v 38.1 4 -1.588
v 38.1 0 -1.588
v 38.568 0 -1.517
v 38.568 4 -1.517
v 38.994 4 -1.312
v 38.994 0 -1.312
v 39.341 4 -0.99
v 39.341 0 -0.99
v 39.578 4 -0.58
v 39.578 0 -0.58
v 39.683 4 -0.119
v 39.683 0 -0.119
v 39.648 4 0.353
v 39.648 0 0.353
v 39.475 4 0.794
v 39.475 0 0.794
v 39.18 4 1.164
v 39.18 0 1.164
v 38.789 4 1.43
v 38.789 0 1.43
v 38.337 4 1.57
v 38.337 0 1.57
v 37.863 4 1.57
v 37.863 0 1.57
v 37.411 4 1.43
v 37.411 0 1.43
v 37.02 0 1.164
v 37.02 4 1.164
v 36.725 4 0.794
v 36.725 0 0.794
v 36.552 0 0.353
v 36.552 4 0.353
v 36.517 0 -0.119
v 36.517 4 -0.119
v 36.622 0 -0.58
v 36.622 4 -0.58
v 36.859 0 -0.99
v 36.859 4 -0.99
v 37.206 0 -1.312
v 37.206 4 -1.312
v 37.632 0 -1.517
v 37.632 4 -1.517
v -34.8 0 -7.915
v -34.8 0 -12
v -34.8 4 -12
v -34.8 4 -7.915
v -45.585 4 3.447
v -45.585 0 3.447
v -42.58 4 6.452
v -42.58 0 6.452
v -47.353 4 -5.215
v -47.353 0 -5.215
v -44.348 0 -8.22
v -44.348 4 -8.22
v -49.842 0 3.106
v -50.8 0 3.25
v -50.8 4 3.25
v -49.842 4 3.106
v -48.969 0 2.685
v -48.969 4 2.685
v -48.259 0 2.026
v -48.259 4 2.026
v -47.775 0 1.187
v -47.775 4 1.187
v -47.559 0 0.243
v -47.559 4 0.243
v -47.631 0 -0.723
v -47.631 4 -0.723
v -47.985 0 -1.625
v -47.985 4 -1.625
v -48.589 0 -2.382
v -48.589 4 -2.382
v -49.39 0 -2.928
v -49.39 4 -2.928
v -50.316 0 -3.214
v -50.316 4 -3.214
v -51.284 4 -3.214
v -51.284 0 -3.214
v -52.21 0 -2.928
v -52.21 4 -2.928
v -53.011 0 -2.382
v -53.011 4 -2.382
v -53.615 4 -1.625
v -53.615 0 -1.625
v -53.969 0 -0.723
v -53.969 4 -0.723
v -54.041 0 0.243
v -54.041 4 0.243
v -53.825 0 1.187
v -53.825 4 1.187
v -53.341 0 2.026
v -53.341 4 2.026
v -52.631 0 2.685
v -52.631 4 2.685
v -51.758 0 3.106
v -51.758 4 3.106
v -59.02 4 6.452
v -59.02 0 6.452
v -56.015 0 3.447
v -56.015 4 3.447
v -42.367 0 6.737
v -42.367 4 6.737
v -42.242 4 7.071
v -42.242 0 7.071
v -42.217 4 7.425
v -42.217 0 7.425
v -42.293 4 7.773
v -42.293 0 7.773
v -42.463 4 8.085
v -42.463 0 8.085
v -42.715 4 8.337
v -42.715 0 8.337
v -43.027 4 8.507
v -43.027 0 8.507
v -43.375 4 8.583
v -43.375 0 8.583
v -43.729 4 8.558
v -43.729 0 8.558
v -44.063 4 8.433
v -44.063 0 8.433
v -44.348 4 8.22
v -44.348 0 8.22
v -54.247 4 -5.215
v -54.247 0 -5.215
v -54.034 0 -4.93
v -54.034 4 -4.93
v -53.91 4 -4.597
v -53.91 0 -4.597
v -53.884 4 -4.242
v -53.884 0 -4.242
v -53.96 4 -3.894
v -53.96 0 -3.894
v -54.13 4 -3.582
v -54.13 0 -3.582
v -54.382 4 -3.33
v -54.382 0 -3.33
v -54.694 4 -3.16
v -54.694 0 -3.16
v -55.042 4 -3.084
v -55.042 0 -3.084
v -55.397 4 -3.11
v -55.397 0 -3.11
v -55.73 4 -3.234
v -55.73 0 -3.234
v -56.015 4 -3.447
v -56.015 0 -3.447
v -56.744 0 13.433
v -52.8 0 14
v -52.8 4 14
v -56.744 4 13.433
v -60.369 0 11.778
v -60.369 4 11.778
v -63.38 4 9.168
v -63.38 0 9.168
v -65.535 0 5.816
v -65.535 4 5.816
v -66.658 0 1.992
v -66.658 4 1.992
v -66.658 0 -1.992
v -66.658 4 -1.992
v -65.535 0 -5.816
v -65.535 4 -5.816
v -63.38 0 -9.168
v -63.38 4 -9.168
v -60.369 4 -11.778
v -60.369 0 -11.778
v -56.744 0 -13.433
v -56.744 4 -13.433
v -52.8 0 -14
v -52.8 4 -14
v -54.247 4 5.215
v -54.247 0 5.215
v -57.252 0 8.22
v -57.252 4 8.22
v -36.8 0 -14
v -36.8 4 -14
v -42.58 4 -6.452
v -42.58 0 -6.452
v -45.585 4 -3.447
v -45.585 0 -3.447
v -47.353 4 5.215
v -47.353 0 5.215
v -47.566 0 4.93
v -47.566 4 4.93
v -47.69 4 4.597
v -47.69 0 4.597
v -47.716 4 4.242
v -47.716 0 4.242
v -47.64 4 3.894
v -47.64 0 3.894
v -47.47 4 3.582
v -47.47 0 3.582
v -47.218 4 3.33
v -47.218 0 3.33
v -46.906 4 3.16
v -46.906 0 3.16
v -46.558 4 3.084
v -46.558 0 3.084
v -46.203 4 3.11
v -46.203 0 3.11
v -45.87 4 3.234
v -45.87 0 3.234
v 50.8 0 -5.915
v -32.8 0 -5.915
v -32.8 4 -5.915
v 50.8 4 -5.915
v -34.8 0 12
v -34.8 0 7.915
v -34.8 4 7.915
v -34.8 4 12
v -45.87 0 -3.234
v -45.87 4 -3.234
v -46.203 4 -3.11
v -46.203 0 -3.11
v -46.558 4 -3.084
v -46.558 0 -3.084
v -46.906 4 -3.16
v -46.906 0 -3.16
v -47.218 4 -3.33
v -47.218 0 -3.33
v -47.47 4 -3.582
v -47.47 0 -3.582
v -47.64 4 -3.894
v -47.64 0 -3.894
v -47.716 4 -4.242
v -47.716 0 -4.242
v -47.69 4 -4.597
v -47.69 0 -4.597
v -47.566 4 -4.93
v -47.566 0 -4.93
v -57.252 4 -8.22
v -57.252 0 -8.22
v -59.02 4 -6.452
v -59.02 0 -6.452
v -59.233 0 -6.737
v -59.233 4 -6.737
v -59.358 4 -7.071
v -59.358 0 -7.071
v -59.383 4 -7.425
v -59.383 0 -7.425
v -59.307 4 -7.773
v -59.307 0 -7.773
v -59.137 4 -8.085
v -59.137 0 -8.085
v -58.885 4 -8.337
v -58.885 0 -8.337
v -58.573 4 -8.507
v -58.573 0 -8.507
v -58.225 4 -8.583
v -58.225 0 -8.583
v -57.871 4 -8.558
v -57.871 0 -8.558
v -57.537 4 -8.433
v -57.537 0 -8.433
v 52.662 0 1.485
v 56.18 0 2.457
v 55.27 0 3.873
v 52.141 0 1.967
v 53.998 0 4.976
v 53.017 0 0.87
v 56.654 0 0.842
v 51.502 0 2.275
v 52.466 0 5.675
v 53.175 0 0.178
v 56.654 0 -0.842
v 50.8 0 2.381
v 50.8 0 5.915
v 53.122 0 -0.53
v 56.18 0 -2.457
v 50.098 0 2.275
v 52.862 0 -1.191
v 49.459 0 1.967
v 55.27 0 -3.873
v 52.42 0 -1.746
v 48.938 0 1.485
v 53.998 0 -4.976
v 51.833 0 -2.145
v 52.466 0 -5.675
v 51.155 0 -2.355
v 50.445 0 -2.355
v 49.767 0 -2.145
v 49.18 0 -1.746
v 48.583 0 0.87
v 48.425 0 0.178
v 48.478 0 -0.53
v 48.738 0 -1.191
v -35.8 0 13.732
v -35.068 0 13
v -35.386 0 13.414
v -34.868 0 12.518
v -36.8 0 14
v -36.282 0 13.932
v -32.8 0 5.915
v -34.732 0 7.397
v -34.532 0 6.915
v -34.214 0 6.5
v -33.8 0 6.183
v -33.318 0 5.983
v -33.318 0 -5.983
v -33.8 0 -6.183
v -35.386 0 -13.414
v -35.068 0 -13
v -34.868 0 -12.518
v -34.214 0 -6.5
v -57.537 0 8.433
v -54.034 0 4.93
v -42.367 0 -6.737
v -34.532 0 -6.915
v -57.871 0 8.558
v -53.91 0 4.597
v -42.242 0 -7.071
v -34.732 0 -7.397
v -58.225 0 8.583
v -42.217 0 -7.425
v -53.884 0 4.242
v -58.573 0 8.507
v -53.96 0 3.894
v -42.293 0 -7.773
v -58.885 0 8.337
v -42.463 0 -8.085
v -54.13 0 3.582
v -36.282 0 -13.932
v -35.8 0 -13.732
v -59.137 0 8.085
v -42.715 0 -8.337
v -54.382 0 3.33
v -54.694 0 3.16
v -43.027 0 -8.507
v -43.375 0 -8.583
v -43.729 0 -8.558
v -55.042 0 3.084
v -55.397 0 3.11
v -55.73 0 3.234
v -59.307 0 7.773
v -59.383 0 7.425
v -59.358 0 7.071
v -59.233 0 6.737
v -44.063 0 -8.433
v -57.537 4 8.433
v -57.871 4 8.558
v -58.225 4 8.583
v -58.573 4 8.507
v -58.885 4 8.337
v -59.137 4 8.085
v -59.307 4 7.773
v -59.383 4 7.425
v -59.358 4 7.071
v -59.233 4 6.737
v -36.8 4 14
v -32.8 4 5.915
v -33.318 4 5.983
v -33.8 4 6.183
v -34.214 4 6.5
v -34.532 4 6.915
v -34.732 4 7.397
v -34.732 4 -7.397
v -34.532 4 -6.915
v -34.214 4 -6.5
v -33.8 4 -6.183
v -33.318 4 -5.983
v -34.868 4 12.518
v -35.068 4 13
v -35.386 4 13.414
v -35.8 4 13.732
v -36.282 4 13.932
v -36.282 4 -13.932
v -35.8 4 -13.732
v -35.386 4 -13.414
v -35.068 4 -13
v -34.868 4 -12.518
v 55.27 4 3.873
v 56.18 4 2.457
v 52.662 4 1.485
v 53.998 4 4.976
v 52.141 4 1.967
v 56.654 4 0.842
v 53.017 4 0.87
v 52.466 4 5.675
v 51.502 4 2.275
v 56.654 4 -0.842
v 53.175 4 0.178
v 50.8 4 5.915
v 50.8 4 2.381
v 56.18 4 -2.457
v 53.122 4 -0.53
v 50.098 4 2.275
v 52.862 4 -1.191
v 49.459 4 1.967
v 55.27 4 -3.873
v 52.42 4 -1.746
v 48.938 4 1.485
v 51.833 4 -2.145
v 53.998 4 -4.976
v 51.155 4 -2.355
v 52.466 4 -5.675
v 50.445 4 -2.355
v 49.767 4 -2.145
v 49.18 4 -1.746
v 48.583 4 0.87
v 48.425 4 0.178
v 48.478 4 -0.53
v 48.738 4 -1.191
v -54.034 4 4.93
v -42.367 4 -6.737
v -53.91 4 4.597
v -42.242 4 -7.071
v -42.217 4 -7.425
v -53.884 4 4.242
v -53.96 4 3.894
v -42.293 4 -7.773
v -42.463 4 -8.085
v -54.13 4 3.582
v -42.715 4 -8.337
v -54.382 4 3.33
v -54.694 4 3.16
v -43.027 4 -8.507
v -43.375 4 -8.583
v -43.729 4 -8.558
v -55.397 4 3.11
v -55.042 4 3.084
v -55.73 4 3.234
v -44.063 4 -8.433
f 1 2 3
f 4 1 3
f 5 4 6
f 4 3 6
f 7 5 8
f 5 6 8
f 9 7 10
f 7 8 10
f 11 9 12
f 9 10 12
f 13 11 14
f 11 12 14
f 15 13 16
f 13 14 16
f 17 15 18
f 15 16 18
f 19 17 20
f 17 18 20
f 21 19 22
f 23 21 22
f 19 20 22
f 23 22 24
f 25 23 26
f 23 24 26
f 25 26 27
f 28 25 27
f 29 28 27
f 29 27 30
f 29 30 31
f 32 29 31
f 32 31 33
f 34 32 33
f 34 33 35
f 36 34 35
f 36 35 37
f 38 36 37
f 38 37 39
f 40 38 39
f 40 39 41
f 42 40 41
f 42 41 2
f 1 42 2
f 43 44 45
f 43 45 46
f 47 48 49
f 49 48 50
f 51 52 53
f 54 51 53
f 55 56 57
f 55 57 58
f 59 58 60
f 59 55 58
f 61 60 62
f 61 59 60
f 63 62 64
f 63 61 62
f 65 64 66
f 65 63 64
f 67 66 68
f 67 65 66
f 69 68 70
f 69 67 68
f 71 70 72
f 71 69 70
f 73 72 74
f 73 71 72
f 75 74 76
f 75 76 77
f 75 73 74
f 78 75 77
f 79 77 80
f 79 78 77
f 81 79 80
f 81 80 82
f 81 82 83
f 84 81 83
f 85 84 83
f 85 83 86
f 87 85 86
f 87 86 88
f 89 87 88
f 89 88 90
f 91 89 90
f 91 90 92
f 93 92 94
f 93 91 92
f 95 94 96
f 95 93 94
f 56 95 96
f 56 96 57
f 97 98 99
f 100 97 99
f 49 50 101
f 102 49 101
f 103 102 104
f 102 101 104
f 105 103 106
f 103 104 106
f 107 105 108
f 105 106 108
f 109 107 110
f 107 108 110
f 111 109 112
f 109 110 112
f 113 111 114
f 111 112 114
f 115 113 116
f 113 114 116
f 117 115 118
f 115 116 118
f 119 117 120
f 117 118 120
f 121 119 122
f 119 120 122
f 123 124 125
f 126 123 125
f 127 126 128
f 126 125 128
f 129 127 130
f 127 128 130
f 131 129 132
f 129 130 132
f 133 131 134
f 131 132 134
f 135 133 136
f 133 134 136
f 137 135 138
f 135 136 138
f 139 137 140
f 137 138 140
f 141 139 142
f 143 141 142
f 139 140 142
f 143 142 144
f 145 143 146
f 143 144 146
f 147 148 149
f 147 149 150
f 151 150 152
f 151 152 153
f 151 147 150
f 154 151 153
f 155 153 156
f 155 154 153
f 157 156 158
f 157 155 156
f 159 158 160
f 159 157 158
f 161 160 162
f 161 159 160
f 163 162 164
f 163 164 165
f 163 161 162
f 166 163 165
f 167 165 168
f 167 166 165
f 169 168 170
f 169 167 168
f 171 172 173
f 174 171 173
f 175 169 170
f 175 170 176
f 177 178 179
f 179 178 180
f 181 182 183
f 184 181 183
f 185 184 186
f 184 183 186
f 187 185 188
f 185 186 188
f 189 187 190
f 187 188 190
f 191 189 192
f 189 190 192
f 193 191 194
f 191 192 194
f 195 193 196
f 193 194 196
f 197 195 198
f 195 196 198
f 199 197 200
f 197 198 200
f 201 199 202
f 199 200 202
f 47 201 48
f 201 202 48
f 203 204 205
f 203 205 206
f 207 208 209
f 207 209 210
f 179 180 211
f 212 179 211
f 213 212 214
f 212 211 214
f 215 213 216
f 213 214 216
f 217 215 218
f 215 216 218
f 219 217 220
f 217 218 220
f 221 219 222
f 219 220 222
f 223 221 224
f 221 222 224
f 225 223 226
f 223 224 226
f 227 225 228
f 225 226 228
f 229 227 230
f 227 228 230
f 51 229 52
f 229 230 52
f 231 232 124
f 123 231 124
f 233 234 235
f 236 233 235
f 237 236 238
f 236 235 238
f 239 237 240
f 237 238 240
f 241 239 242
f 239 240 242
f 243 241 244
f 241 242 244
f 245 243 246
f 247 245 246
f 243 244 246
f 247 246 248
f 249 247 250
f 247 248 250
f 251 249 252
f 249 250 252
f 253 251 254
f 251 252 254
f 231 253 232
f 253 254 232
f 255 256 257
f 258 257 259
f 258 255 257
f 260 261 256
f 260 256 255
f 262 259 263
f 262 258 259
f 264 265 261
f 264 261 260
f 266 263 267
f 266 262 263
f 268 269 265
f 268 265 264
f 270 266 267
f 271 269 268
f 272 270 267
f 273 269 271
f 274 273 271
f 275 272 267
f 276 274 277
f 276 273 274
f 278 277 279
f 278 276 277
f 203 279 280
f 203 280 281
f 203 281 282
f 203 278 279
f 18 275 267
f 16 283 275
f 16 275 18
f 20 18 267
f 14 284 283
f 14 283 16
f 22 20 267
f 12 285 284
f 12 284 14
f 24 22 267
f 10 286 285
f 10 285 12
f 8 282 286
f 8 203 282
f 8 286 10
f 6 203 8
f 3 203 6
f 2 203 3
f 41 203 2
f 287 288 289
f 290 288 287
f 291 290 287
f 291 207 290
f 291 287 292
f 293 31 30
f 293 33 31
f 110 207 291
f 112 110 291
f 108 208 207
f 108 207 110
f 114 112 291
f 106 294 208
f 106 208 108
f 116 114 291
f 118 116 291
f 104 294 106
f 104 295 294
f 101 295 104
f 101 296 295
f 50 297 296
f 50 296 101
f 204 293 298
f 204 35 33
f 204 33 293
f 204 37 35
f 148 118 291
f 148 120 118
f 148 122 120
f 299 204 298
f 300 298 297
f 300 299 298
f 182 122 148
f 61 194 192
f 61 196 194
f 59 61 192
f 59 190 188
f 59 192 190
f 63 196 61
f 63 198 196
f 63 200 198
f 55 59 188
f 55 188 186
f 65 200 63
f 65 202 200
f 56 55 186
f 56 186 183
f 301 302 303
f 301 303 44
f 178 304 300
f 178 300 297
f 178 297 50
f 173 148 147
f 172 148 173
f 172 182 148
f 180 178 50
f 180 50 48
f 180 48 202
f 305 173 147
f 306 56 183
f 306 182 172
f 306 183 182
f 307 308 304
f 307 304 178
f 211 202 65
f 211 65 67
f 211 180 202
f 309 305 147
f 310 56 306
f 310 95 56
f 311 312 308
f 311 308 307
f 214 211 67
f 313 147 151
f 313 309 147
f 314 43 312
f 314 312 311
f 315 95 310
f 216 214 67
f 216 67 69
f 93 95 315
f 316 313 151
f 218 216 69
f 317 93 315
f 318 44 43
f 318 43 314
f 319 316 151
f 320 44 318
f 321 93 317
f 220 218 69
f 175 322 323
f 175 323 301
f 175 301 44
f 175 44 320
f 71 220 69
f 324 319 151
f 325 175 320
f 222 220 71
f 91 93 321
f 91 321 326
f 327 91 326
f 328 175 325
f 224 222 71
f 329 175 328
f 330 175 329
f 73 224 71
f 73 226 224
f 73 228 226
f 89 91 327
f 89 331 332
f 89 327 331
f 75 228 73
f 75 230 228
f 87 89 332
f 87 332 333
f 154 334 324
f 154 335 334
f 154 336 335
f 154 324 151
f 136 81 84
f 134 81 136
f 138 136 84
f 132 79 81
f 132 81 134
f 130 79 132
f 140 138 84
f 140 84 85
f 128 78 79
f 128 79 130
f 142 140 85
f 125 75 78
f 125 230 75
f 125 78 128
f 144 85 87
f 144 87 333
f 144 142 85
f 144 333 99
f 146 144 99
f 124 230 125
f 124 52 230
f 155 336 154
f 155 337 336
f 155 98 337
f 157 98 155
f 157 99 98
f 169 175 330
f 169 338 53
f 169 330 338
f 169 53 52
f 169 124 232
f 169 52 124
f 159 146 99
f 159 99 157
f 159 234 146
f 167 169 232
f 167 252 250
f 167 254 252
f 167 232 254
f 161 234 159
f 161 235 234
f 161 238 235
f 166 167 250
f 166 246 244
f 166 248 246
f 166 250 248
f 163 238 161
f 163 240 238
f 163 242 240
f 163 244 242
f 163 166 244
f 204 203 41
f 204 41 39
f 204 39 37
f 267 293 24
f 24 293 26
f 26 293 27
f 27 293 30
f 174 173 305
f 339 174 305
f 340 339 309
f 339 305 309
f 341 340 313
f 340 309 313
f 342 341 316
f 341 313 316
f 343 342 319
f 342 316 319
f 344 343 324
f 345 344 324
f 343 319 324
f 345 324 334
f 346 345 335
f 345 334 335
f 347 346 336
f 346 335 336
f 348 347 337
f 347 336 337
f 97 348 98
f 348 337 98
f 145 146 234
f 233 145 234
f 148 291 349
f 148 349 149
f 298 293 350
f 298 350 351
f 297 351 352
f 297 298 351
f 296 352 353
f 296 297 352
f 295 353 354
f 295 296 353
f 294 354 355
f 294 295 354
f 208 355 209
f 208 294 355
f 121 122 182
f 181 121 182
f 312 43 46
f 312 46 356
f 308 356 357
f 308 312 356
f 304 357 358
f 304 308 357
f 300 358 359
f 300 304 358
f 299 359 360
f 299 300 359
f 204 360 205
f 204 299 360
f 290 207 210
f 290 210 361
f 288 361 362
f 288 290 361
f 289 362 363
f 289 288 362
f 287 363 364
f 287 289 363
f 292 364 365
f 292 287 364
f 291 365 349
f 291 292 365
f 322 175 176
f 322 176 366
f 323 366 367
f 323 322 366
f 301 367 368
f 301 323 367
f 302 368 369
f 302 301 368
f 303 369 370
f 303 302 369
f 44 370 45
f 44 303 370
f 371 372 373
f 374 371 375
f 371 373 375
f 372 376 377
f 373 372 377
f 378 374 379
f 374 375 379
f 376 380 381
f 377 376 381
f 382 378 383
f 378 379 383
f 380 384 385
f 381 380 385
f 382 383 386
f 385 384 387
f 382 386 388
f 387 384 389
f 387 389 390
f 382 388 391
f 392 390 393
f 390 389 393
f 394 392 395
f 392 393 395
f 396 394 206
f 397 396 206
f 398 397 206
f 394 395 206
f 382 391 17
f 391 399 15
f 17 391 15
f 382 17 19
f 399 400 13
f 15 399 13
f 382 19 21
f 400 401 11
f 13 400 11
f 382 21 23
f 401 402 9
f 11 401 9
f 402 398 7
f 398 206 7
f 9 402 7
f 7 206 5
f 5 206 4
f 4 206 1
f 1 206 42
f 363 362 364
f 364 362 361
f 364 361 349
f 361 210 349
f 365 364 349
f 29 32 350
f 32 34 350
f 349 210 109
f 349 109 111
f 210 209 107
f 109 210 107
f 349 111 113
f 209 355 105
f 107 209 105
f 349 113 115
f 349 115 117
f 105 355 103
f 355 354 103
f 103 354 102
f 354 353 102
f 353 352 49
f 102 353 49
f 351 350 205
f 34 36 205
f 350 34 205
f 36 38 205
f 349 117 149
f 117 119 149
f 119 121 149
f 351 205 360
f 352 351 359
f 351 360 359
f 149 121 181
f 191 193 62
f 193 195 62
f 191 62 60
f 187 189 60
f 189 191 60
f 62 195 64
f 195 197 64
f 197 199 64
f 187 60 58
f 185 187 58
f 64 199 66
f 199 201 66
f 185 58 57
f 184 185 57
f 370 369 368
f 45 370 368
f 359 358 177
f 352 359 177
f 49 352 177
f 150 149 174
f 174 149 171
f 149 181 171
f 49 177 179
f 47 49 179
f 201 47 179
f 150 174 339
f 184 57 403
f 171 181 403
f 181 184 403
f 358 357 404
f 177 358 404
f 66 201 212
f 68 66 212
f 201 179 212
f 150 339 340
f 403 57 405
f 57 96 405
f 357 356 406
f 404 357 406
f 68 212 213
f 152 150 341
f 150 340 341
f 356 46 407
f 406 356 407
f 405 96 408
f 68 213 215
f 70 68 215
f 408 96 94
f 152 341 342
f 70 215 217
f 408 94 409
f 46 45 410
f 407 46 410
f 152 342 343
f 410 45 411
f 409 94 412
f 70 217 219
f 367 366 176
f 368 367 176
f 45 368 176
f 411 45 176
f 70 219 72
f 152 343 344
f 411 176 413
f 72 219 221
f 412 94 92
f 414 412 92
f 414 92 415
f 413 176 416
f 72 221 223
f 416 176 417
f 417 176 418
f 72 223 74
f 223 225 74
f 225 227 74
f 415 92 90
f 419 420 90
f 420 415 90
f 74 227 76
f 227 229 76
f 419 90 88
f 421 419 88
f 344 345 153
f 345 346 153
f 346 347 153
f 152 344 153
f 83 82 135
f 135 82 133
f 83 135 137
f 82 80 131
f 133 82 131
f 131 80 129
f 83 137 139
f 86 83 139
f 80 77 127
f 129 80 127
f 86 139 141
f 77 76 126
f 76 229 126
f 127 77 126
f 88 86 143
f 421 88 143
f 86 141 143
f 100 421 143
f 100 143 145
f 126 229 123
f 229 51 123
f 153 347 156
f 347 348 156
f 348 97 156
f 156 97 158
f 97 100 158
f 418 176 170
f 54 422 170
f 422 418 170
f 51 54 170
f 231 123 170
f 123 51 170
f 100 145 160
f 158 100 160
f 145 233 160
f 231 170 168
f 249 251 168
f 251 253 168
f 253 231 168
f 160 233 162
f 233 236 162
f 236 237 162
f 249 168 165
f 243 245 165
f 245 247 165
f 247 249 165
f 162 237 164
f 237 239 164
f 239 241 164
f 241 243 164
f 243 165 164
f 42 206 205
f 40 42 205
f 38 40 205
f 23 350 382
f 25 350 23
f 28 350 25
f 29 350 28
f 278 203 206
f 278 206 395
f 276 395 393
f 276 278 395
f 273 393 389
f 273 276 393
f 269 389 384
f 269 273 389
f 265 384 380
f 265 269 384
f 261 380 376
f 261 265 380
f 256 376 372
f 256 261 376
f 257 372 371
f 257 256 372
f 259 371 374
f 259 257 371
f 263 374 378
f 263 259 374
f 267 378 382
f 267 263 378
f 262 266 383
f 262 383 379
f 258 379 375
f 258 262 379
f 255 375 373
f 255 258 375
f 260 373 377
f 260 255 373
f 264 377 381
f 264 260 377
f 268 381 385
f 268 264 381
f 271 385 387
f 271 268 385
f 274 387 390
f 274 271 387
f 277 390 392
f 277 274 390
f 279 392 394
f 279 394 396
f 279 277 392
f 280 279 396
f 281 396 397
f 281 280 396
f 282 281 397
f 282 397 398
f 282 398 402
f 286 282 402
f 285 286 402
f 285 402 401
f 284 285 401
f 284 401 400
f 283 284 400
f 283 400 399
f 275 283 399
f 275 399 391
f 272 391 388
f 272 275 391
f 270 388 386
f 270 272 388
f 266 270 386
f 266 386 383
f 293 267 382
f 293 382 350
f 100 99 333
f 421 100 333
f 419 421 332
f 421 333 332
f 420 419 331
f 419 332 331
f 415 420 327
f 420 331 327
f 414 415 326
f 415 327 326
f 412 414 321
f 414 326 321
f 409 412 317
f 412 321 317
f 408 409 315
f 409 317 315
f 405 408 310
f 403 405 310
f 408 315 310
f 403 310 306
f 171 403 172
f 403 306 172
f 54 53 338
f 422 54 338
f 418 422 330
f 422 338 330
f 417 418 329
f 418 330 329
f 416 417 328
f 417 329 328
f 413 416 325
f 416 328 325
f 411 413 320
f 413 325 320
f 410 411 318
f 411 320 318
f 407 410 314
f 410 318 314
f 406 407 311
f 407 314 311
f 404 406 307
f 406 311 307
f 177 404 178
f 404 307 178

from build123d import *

# Parameters (mm, degrees)
SKETCH1_R           = 3.25
SKETCH1_R_2         = 2.38125
BOSS_EXTRUDE1_DEPTH = 4
SKETCH2_R           = 1.5875
CUT_EXTRUDE1_DEPTH  = 10


with BuildPart() as part:
    # Sketch1 → Boss-Extrude1 (new body)
    with BuildSketch(Plane(origin=(0, 0, 0), x_dir=(1, 0, 0), z_dir=(0, 1, 0))):
        with BuildLine():
            Line((-50.8, 14), (-36.8, 14))
            ThreePointArc((-36.8, 14), (-35.385786438, 13.414213562), (-34.8, 12))
            Line((-34.8, 12), (-34.8, 7.914556152))
            ThreePointArc((-34.8, 7.914556152), (-34.214213562, 6.500342589), (-32.8, 5.914556152))
            Line((-32.8, 5.914556152), (50.8, 5.914556152))
            ThreePointArc((50.8, 5.914556152), (56.714556152, 0), (50.8, -5.914556152))
            Line((50.8, -5.914556152), (-32.8, -5.914556152))
            ThreePointArc((-32.8, -5.914556152), (-34.214213562, -6.500342589), (-34.8, -7.914556152))
            Line((-34.8, -7.914556152), (-34.8, -12))
            ThreePointArc((-34.8, -12), (-35.385786438, -13.414213562), (-36.8, -14))
            Line((-36.8, -14), (-50.8, -14))
            Line((-50.8, -14), (-52.8, -14))
            ThreePointArc((-52.8, -14), (-66.8, 0), (-52.8, 14))
            Line((-52.8, 14), (-50.8, 14))
        make_face()
        with Locations(Location((-50.8, 0, 0), (0, 0, 270))):
            Circle(SKETCH1_R, mode=Mode.SUBTRACT)
        with Locations(Location((50.8, 0, 0), (0, 0, 270))):
            Circle(SKETCH1_R_2, mode=Mode.SUBTRACT)
        with BuildLine():
            Line((-57.252349378, 8.220116331), (-54.247145558, 5.214912511))
            ThreePointArc((-54.247145558, 5.214912511), (-54.247145558, 3.447145558), (-56.014912511, 3.447145558))
            Line((-56.014912511, 3.447145558), (-59.020116331, 6.452349378))
            ThreePointArc((-59.020116331, 6.452349378), (-59.020116331, 8.220116331), (-57.252349378, 8.220116331))
        make_face(mode=Mode.SUBTRACT)
        with BuildLine():
            Line((-42.579883669, 6.452349378), (-45.585087489, 3.447145558))
            ThreePointArc((-45.585087489, 3.447145558), (-47.352854442, 3.447145558), (-47.352854442, 5.214912511))
            Line((-47.352854442, 5.214912511), (-44.347650622, 8.220116331))
            ThreePointArc((-44.347650622, 8.220116331), (-42.579883669, 8.220116331), (-42.579883669, 6.452349378))
        make_face(mode=Mode.SUBTRACT)
        with BuildLine():
            Line((-44.347650622, -8.220116331), (-47.352854442, -5.214912511))
            ThreePointArc((-47.352854442, -5.214912511), (-47.352854442, -3.447145558), (-45.585087489, -3.447145558))
            Line((-45.585087489, -3.447145558), (-42.579883669, -6.452349378))
            ThreePointArc((-42.579883669, -6.452349378), (-42.579883669, -8.220116331), (-44.347650622, -8.220116331))
        make_face(mode=Mode.SUBTRACT)
        with BuildLine():
            Line((-59.020116331, -6.452349378), (-56.014912511, -3.447145558))
            ThreePointArc((-56.014912511, -3.447145558), (-54.247145558, -3.447145558), (-54.247145558, -5.214912511))
            Line((-54.247145558, -5.214912511), (-57.252349378, -8.220116331))
            ThreePointArc((-57.252349378, -8.220116331), (-59.020116331, -8.220116331), (-59.020116331, -6.452349378))
        make_face(mode=Mode.SUBTRACT)
    extrude(amount=BOSS_EXTRUDE1_DEPTH)

    # Sketch2 → Cut-Extrude1 (cut)
    with BuildSketch(Plane.XZ):
        with Locations(Location((38.1, 0, 0), (0, 0, 270))):
            Circle(SKETCH2_R)
    extrude(amount=-CUT_EXTRUDE1_DEPTH, mode=Mode.SUBTRACT)


solid = part.part
